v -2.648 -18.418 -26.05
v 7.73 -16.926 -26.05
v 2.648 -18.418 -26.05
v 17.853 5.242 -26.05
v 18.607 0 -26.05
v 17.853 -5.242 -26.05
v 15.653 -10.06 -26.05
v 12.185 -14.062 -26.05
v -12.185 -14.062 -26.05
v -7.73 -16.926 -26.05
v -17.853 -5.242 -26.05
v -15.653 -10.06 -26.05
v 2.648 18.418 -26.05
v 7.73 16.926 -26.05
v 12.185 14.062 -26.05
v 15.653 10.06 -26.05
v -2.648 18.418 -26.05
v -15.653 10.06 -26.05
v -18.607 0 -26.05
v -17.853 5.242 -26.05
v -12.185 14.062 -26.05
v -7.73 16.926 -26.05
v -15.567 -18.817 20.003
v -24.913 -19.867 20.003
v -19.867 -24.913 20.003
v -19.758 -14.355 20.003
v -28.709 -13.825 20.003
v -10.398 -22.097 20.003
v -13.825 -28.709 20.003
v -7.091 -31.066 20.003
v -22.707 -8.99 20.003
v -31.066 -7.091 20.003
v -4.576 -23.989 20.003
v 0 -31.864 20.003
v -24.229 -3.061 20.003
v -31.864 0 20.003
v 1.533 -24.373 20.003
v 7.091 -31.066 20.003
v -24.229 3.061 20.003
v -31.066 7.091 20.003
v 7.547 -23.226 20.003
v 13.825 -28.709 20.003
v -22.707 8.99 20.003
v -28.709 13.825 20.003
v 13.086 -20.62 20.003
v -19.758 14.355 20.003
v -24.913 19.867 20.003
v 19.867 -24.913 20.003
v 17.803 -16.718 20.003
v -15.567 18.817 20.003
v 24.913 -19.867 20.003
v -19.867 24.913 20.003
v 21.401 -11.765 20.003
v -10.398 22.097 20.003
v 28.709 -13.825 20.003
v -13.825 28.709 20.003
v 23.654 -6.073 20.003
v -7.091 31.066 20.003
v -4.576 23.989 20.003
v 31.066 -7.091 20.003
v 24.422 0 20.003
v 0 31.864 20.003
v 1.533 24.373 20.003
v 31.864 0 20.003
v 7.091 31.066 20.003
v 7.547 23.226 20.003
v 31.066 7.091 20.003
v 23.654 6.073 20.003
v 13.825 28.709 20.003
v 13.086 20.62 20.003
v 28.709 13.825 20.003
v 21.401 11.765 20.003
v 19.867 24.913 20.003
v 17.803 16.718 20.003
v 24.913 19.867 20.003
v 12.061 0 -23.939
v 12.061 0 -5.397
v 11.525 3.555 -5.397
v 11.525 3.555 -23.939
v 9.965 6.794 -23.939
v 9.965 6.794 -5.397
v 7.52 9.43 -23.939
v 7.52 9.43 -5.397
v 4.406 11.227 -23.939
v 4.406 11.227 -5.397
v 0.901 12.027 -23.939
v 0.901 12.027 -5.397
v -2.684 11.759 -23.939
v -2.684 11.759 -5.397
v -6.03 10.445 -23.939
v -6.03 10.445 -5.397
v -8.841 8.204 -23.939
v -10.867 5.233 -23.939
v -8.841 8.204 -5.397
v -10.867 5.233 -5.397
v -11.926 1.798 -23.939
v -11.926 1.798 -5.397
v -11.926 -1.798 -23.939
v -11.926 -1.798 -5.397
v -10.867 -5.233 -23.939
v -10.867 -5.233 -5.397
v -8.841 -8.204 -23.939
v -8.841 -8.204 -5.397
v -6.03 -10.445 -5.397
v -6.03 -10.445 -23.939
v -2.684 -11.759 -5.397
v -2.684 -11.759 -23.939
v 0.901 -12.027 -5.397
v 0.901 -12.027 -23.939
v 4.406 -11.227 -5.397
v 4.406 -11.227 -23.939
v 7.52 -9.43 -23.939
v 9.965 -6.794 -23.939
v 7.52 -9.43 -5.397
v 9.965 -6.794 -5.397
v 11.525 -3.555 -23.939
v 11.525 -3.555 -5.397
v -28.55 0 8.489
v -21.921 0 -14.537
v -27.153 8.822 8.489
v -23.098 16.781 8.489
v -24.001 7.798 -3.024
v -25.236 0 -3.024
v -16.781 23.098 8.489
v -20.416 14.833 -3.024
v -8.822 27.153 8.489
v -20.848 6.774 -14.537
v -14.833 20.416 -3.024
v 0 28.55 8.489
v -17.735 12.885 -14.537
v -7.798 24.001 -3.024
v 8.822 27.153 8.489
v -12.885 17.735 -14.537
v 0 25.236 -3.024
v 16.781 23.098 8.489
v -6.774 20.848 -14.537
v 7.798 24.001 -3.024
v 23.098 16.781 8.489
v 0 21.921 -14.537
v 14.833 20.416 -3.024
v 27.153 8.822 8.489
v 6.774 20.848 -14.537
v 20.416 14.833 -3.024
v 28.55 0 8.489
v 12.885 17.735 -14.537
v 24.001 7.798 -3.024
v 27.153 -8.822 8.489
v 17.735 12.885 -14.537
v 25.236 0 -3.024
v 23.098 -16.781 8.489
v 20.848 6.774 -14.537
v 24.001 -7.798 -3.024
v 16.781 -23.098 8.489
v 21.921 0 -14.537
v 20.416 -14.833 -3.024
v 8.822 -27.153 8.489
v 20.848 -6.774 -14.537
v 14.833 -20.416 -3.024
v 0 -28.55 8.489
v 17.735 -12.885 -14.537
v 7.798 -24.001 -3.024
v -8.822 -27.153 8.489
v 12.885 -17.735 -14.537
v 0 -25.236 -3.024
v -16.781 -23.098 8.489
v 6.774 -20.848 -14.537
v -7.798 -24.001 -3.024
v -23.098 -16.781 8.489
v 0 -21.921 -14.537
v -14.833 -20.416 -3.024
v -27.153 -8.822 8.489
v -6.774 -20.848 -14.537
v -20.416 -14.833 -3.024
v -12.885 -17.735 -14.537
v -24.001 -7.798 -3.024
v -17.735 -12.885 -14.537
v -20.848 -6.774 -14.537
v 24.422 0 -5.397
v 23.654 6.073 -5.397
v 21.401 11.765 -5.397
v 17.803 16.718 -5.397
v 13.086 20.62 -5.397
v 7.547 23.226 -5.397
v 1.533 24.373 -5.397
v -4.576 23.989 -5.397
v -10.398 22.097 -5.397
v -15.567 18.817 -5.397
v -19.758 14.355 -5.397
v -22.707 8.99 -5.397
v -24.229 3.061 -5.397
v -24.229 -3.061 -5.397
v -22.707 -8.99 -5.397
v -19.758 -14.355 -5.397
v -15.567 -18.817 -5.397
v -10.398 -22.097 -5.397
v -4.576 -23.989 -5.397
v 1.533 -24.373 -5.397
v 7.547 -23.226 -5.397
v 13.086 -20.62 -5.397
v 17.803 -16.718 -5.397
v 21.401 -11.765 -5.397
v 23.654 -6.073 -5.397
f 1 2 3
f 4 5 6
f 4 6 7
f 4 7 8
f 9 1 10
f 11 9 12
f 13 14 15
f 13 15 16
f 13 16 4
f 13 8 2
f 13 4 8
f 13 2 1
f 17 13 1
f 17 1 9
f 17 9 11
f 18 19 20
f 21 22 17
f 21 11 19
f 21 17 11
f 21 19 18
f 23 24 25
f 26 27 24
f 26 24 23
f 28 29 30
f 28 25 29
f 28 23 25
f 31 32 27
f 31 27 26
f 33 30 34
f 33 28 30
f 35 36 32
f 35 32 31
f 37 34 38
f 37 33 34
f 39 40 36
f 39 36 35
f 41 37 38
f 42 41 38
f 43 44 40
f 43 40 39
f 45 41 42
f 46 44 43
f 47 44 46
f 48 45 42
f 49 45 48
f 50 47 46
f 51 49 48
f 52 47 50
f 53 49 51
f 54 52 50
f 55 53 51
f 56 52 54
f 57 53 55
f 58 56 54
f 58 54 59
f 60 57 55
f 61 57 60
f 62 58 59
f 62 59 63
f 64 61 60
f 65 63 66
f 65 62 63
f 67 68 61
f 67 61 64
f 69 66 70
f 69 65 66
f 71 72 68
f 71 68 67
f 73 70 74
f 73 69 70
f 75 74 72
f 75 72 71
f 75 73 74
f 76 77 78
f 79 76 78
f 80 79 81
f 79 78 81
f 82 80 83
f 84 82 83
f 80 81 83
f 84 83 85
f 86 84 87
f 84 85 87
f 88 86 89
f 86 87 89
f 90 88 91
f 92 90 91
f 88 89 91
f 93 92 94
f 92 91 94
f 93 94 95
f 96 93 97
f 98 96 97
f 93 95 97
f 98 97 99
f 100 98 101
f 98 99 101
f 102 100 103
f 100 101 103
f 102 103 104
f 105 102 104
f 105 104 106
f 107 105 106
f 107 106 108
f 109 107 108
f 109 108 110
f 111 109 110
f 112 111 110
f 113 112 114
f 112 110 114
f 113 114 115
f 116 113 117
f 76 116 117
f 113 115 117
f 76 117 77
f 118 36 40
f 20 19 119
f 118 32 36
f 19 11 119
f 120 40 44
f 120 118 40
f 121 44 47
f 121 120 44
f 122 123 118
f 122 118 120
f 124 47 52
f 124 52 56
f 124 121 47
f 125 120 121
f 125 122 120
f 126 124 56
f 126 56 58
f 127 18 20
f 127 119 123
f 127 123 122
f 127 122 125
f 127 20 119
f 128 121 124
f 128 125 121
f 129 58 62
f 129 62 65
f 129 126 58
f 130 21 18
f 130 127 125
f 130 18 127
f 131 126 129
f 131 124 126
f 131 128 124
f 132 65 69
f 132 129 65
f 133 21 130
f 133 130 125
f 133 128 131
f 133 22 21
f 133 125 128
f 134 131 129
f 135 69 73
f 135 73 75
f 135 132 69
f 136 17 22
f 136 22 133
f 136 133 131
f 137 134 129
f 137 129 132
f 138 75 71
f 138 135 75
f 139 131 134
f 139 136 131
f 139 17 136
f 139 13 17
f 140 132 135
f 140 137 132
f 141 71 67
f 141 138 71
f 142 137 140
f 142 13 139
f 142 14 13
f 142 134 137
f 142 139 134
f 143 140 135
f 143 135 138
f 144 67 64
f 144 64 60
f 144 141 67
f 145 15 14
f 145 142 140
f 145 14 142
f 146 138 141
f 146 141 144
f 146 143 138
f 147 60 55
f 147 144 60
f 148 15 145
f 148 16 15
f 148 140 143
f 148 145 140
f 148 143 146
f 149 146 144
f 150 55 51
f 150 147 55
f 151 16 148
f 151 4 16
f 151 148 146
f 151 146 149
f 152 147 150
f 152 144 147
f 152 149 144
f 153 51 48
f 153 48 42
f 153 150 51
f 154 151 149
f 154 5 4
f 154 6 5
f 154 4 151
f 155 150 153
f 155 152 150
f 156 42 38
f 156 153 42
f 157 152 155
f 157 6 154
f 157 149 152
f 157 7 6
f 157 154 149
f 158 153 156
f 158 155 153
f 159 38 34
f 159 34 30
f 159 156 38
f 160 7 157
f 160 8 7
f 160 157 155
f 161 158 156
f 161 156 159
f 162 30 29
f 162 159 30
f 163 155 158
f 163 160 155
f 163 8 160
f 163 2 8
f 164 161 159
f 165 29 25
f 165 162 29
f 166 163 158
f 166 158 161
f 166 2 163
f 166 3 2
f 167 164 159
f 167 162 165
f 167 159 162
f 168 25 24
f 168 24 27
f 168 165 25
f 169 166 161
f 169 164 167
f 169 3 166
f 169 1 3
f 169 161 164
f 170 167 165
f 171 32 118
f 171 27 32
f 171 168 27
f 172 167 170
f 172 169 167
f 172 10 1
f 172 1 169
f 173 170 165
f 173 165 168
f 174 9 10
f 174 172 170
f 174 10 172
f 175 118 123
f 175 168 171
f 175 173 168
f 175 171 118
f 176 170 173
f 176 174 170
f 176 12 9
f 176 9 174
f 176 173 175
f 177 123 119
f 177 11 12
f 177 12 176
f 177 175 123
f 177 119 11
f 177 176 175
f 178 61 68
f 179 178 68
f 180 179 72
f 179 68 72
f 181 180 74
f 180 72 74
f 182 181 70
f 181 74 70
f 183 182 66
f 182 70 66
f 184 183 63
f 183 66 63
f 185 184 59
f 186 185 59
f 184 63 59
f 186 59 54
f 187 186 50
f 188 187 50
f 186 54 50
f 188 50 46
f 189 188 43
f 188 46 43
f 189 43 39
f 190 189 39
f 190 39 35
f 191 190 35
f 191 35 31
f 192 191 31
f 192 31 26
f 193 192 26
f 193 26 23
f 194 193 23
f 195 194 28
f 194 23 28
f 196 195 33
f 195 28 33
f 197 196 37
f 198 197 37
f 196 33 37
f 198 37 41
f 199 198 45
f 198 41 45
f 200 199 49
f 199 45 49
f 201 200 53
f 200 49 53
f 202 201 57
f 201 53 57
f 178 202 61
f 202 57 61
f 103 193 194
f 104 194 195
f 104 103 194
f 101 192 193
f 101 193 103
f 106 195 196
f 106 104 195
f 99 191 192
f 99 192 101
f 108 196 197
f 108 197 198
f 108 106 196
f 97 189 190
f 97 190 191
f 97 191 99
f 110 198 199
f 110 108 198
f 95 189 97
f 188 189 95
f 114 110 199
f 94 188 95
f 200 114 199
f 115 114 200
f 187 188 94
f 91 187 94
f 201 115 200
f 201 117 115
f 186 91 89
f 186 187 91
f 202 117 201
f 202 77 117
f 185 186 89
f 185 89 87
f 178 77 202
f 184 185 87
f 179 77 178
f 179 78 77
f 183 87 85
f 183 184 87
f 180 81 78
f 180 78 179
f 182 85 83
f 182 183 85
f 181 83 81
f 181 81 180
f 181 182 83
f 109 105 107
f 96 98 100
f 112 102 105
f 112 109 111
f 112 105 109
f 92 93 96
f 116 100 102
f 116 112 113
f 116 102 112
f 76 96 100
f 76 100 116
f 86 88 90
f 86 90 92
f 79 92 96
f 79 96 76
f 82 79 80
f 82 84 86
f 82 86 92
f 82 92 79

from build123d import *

# Parameters (mm, degrees)
F2_R     = 24.421659
F3_DEPTH = 25.4
F4_R     = 12.060942
F5_DEPTH = 18.542


with BuildPart() as f1:
    # F0 (on Front) → F1 (revolve)
    with BuildSketch(Plane.XZ):
        Polygon((0, -26.049769), (0, 20.002501), (-31.864449, 20.002501), (-18.606978, -26.049769), align=None)
    revolve(axis=Axis((0, 0, -3.023634), (0, 0, -1)))

    # F2 (on face) → F3 (cut)
    with BuildSketch(Plane.XY.offset(20.002501)):
        Circle(F2_R)
    extrude(amount=-F3_DEPTH, mode=Mode.SUBTRACT)

    # F4 (on face) → F5 (cut)
    with BuildSketch(Plane.XY.offset(-5.397499)):
        Circle(F4_R)
    extrude(amount=-F5_DEPTH, mode=Mode.SUBTRACT)


solid = f1.part
